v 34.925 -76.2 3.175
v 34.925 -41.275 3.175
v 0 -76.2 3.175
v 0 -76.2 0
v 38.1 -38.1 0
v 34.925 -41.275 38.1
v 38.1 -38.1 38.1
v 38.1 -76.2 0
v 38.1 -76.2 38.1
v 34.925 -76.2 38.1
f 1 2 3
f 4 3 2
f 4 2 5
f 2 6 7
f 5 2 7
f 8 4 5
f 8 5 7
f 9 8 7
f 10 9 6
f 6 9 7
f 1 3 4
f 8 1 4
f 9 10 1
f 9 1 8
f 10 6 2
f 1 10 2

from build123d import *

# Parameters (mm, degrees)
F1_DEPTH = 76.2
F3_DEPTH = 38.101


# Not quite as in the source:
# - a feature names something its author has since deleted; it is built from what else it names


with BuildPart() as f1:
    # F0 (on Front) → F1 (new body)
    with BuildSketch(Plane.XZ):
        Polygon((0, 3.175), (0, 0), (38.1, 0), (38.1, 38.1), (34.925, 38.1), (34.925, 3.175), align=None)
    extrude(amount=F1_DEPTH)

    # F2 (on face) → F3 (cut, through all)
    with BuildSketch(Plane.XY.offset(38.1)):
        Polygon((34.925, -41.275), (34.925, 0), (0, 0), (0, -76.2), align=None)
        Polygon((38.1, 0), (34.925, 0), (34.925, -41.275), (38.1, -38.1), align=None)
    extrude(amount=-F3_DEPTH, mode=Mode.SUBTRACT)


solid = f1.part
